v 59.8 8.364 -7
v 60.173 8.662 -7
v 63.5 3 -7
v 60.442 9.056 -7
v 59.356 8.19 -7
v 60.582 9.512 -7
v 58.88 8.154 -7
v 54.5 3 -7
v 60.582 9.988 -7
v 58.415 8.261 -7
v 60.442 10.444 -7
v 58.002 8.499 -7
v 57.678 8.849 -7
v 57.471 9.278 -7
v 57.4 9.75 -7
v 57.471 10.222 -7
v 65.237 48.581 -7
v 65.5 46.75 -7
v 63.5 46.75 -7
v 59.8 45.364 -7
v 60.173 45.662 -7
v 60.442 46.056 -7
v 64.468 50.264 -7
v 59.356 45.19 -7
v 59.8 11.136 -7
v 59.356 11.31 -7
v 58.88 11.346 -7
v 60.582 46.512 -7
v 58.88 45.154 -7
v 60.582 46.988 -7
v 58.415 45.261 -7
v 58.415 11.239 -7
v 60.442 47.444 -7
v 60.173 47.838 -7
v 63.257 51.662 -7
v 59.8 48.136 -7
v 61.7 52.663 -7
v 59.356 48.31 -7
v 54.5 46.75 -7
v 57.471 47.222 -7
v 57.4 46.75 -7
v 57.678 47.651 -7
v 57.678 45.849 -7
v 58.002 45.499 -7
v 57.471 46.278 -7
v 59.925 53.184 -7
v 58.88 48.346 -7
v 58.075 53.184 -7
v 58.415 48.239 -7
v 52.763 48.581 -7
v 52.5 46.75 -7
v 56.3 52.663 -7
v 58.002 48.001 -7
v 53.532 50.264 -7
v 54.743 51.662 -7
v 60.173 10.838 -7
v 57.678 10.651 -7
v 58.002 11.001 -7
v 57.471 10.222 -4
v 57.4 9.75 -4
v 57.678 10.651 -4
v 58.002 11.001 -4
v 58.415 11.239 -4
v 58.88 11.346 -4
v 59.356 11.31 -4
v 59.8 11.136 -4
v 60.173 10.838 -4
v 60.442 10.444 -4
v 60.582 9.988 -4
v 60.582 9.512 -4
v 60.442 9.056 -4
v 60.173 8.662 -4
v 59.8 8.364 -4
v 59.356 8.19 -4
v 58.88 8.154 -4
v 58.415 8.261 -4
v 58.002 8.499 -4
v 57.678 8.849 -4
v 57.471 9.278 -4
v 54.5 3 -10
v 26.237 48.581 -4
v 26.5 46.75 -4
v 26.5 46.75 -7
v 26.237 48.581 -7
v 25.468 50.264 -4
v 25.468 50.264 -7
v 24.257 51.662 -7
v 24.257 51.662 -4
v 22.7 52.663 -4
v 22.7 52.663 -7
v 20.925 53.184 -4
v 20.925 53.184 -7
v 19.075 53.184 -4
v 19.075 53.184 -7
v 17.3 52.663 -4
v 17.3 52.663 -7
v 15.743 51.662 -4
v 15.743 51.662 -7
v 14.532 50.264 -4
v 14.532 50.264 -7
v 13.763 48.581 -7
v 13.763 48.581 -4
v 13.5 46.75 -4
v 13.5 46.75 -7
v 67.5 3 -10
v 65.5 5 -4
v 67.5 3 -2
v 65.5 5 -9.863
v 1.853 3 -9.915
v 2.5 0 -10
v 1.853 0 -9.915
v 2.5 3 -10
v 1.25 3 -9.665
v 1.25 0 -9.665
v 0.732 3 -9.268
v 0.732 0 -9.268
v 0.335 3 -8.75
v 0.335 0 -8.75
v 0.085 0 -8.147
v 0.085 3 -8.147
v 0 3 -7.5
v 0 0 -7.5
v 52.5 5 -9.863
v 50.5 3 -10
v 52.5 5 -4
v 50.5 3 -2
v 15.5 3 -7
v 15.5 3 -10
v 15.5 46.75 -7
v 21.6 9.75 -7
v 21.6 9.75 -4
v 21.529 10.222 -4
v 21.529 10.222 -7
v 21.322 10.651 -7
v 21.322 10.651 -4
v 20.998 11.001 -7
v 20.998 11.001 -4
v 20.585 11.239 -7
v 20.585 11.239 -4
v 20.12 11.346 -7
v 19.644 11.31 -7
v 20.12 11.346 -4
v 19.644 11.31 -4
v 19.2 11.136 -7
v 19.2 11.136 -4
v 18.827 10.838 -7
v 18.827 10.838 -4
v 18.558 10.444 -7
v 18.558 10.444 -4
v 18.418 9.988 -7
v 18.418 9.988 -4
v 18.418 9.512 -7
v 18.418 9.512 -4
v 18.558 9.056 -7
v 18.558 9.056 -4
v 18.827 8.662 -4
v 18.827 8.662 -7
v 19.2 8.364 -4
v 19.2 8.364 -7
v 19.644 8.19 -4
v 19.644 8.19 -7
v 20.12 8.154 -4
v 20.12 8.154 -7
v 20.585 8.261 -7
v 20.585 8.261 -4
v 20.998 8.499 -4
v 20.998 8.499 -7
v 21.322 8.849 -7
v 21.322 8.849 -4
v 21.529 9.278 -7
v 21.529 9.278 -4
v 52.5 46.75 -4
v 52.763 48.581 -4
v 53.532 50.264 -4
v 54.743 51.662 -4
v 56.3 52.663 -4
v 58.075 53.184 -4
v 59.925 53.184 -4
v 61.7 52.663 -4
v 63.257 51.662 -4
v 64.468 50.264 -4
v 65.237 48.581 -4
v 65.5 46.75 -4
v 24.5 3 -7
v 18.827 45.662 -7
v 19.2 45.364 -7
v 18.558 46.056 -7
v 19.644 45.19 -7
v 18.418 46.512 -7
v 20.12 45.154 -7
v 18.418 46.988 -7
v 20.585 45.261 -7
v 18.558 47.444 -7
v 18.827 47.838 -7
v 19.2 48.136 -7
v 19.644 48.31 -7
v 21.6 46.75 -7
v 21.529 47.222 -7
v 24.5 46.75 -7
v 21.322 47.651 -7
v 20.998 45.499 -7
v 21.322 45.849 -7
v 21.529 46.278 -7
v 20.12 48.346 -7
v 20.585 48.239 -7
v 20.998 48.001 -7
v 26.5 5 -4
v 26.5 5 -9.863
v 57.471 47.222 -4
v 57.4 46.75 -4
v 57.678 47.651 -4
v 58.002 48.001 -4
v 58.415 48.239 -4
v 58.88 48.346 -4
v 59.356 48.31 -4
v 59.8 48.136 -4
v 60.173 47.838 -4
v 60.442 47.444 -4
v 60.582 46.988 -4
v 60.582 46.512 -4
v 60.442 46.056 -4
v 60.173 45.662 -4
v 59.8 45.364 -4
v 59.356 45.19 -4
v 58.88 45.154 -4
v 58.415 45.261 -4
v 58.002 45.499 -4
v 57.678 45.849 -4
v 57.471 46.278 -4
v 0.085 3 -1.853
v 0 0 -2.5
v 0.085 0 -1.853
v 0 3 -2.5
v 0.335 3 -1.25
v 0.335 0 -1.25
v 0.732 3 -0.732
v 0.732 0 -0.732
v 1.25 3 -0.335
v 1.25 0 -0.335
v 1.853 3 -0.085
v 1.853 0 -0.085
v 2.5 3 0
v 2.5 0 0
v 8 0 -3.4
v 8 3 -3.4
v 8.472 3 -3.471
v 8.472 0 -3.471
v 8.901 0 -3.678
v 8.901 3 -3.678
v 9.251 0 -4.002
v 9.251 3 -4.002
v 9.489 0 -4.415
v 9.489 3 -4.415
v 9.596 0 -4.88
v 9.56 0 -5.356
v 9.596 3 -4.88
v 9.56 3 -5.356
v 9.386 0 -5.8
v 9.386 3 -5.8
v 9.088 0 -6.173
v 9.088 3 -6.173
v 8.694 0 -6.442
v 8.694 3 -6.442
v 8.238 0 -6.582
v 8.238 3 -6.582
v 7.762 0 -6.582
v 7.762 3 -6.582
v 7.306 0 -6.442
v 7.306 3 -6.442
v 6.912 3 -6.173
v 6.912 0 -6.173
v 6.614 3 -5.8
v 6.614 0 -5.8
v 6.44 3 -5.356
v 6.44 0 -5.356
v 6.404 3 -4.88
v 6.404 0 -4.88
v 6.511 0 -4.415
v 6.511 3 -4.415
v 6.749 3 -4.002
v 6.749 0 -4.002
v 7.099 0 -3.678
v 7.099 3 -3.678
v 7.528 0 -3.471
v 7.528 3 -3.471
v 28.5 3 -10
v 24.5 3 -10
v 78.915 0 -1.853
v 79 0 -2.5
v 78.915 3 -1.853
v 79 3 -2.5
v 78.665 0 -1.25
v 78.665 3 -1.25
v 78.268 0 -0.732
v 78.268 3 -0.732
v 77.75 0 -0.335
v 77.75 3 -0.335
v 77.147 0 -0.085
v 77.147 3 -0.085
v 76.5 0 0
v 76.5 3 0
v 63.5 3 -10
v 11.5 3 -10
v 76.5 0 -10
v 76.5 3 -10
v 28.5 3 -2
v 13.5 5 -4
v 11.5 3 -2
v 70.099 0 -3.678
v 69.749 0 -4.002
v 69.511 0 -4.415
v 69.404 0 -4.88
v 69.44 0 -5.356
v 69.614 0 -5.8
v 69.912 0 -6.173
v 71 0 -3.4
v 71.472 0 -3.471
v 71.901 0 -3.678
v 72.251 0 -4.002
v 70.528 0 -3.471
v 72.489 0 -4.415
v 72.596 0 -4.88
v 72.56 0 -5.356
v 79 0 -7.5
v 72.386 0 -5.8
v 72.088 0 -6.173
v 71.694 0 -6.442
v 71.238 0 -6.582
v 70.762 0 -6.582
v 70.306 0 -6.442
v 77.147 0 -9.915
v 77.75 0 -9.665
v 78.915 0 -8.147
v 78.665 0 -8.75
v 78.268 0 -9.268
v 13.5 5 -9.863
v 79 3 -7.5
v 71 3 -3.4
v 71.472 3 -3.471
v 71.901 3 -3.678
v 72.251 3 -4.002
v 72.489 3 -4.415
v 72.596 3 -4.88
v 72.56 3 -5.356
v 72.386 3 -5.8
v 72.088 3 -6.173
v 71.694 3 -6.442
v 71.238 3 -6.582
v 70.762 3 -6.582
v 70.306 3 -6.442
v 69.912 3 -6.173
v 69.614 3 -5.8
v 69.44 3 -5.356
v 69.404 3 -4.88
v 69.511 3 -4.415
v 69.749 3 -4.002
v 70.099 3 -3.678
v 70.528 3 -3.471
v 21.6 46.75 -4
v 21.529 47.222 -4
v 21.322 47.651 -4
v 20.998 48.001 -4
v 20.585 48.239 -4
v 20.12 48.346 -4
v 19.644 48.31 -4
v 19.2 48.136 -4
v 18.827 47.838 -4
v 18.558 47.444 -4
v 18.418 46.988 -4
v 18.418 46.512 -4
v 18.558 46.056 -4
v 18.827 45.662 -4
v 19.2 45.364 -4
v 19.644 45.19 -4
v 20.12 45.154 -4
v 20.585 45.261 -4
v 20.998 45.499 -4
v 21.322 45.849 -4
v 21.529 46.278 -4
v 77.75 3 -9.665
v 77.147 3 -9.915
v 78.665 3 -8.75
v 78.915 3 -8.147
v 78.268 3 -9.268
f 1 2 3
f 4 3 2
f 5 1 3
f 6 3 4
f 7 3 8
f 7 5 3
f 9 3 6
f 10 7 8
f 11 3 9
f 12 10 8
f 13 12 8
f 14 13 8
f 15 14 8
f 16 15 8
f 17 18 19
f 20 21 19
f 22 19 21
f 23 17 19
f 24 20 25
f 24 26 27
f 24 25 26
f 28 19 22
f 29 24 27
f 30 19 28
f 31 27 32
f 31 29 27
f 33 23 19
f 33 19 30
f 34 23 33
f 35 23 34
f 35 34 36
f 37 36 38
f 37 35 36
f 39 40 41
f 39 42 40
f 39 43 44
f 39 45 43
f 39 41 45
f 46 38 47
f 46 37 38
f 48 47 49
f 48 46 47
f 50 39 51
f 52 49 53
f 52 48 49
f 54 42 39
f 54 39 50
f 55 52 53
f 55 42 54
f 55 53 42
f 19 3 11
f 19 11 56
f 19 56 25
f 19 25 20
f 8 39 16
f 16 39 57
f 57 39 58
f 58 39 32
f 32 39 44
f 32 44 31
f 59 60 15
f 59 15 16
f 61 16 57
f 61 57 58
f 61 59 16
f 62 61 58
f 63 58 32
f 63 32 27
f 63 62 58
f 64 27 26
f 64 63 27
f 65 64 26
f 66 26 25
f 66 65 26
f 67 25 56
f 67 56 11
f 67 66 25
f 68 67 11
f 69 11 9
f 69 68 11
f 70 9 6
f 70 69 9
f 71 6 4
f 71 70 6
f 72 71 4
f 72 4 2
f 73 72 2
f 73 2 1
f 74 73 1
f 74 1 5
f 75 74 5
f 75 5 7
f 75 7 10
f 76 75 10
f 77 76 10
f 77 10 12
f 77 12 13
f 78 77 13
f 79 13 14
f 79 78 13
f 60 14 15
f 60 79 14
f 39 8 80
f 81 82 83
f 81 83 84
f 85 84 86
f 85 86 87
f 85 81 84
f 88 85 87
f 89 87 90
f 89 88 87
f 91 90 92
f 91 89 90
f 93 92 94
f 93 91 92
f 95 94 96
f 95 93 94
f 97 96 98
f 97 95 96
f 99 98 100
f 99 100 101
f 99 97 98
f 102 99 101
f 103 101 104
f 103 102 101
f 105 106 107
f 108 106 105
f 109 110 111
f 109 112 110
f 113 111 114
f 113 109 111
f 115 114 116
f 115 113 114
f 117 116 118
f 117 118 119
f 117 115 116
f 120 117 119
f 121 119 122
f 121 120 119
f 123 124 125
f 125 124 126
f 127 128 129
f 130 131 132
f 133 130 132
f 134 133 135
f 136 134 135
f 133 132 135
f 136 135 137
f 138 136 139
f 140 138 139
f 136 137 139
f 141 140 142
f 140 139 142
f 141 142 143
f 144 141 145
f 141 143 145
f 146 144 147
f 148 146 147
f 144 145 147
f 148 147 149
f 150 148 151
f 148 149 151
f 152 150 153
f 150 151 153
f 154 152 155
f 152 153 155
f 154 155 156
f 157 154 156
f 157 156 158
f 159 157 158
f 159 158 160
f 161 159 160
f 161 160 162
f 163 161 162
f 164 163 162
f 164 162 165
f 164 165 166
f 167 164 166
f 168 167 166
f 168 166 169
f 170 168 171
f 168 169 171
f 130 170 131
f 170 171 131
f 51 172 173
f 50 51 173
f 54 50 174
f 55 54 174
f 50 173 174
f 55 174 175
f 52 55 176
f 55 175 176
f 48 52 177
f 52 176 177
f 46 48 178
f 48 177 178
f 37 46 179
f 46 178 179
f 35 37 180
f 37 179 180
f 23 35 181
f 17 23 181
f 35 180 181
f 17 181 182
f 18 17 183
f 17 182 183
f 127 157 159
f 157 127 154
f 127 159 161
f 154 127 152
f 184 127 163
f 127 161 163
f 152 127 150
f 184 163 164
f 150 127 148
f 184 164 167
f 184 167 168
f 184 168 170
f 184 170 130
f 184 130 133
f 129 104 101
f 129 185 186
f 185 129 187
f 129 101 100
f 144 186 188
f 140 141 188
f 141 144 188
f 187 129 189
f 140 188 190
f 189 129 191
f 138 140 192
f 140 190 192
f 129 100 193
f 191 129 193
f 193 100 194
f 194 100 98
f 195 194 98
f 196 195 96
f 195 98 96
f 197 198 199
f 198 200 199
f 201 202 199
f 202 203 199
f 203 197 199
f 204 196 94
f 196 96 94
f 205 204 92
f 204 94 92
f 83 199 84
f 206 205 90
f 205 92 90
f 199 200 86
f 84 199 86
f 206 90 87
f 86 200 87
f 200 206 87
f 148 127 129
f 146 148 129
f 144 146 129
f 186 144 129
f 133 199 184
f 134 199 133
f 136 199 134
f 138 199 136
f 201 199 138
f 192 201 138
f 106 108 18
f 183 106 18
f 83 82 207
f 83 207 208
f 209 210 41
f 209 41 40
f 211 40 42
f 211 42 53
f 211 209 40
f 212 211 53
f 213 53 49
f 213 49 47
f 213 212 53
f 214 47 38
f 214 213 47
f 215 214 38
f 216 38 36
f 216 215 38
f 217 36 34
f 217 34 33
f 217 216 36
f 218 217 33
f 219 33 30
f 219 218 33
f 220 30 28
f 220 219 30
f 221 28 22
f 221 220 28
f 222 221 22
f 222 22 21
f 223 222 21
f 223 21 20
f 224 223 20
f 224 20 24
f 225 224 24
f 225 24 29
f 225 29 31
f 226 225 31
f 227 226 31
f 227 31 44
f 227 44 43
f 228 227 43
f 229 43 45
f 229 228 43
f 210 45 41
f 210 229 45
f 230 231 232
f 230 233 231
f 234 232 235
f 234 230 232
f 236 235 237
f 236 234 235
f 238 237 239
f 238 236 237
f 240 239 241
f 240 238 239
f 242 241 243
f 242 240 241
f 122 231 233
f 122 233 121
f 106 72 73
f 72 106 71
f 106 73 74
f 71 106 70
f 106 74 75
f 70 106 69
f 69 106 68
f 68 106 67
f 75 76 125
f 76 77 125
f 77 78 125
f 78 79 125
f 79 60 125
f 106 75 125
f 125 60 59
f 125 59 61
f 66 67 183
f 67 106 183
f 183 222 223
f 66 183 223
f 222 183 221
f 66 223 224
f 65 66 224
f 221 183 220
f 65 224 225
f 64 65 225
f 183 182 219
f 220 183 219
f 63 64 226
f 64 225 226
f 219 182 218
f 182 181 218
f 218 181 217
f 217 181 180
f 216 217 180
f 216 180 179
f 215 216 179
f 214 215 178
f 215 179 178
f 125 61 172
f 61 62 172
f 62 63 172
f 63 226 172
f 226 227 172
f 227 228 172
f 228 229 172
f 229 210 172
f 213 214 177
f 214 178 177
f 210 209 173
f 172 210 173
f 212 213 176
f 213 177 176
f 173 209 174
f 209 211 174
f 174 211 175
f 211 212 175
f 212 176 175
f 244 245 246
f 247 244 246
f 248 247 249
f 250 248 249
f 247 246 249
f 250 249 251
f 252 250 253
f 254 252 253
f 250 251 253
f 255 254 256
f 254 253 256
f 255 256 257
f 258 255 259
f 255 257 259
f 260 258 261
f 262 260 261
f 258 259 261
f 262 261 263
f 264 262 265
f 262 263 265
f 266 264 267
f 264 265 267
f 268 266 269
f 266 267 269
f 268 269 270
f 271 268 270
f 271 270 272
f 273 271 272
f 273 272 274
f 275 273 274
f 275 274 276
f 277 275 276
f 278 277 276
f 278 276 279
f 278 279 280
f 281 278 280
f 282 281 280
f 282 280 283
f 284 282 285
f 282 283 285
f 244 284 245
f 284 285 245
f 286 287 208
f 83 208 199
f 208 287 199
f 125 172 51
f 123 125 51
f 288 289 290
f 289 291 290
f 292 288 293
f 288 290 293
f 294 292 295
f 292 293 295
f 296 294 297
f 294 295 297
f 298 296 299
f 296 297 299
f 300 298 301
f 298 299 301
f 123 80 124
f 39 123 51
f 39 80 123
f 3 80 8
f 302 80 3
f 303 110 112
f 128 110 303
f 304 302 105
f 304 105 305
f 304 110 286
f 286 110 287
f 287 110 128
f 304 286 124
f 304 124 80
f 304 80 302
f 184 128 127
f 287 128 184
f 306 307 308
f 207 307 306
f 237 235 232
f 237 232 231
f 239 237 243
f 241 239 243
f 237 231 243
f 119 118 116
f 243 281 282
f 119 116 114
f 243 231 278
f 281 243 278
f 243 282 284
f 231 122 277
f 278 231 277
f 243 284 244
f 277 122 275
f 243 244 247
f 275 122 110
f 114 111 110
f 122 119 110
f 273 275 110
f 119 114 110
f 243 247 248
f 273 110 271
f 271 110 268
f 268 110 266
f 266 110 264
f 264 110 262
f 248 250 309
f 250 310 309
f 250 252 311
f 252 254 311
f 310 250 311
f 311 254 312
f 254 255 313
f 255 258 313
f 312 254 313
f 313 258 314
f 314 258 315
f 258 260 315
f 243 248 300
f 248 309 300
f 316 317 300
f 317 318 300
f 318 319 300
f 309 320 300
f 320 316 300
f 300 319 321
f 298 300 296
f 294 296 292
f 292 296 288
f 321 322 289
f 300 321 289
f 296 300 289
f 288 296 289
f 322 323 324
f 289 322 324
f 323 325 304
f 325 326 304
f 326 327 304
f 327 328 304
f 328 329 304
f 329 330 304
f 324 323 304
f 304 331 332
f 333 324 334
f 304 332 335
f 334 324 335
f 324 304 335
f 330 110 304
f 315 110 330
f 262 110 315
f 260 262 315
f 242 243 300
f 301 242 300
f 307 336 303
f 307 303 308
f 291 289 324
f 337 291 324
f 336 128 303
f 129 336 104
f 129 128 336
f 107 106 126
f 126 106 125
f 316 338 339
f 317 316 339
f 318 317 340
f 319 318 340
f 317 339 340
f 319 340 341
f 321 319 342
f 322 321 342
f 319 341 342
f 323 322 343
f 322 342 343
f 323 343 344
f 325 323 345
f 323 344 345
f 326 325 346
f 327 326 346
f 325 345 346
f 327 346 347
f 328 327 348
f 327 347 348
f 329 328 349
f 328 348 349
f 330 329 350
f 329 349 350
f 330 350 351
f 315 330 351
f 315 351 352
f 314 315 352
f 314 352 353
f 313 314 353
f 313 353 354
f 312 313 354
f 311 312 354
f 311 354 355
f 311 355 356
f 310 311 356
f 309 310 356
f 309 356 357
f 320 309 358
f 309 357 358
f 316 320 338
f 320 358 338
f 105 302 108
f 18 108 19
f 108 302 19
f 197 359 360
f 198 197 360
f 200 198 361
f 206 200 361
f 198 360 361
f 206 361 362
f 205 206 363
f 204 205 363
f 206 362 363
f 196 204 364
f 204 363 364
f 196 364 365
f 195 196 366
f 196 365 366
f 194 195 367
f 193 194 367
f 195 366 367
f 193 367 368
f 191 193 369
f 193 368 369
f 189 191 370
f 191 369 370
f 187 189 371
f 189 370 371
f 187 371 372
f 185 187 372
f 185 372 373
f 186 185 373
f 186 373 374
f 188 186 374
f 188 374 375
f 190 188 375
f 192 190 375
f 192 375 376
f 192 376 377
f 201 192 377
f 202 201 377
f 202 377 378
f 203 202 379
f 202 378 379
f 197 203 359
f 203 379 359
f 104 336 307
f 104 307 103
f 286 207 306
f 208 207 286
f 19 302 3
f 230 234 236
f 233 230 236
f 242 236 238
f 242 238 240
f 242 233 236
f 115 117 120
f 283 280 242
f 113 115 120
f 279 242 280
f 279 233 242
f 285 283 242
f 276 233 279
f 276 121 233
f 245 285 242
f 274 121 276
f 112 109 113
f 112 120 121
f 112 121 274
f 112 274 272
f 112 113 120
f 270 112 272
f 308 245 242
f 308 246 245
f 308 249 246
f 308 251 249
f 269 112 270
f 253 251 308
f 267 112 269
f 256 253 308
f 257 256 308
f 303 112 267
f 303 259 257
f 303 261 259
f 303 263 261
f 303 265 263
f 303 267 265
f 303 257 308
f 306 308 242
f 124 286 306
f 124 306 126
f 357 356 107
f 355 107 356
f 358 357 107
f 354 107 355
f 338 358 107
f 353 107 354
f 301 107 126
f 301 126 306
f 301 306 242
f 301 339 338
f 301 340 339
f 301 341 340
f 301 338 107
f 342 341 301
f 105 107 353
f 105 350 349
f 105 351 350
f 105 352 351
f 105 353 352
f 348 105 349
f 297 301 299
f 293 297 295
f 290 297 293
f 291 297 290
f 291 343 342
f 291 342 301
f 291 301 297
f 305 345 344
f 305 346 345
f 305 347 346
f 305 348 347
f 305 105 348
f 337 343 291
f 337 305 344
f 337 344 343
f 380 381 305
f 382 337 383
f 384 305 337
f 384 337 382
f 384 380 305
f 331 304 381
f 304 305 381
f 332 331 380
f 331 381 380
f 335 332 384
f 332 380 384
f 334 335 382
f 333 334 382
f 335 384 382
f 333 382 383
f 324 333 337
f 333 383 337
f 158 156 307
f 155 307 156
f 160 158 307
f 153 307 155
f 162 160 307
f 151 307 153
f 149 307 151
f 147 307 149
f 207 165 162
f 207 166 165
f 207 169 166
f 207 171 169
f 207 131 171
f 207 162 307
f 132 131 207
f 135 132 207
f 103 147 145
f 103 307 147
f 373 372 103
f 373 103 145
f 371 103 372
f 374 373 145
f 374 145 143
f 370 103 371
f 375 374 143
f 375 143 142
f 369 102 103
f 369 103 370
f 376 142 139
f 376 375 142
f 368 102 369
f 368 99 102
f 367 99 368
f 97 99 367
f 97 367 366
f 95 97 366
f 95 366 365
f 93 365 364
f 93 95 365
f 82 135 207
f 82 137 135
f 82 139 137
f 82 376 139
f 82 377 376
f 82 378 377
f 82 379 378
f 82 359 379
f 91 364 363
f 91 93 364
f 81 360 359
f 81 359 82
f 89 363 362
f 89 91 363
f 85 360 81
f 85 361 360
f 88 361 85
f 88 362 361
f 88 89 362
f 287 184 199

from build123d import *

# Parameters (mm, degrees)
SKETCH_1_W                 = 79
SKETCH_1_H                 = 10
EXTRUDE_1_DEPTH            = 3
SKETCH_2_W                 = 13
SKETCH_2_H                 = 3
EXTRUDE_2_DEPTH            = 43.75
EXTRUDE_3_DEPTH            = 3
RIB_1_REACH                = 87.005
SKETCH_5_WALL_W            = 215.862295072
SKETCH_5_WALL_H            = 2
RIB_2_REACH                = 77.444
SKETCH_7_WALL_W            = 196.740940164
SKETCH_7_WALL_H            = 2
SKETCH_8_R                 = 1.6
CUT_EXTRUDE_1_DEPTH        = 3
FILLET_1_R                 = 2.5
SKETCH_9_R                 = 1.6
CUT_EXTRUDE_5_DEPTH        = 3
CHAMFER_2_SIZE             = 2
CHAMFER_2_OF_MIRROR_1_SIZE = 2


with BuildPart() as part:
    # 草图1 → 凸台-拉伸1 (new body)
    with BuildSketch(Plane(origin=(0, 0, 0), x_dir=(1, 0, 0), z_dir=(0, 1, 0))):
        with Locations((39.5, 5)):
            Rectangle(SKETCH_1_W, SKETCH_1_H)
    extrude(amount=EXTRUDE_1_DEPTH)

    # 草图2 → 凸台-拉伸2 (add)
    with BuildSketch(Plane(origin=(0, 3, 0), x_dir=(1, 0, 0), z_dir=(0, 1, 0))):
        with Locations((20, 5.5)):
            Rectangle(SKETCH_2_W, SKETCH_2_H)
    extrude_2 = extrude(amount=EXTRUDE_2_DEPTH)

    # 草图4 → 凸台-拉伸3 (add)
    with BuildSketch(Plane.XY.offset(-4)):
        with BuildLine():
            Line((13.5, 46.75), (26.5, 46.75))
            ThreePointArc((26.5, 46.75), (20, 53.25), (13.5, 46.75))
        make_face()
    extrude_3 = extrude(amount=-EXTRUDE_3_DEPTH)

    # 草图5 wall → 筋1 (add, up to next)
    with BuildSketch(Plane(origin=(13.5, 24.875, -8.5), x_dir=(0, 0.997657238183, 0.068410782047), z_dir=(0, 0.068410782047, -0.997657238183)), mode=Mode.PRIVATE) as rib_1_sk1:
        with Locations((0, 1)):
            Rectangle(SKETCH_5_WALL_W, SKETCH_5_WALL_H)
    rib_1_tool1 = extrude(rib_1_sk1.sketch, amount=-RIB_1_REACH, mode=Mode.PRIVATE) - part.part
    rib_1 = rib_1_tool1.solids().sort_by_distance((13.5, 24.875, -8.5))[0]
    add(rib_1)

    # 草图7 wall → 筋2 (add, up to next)
    with BuildSketch(Plane(origin=(26.5, 24.875, -8.5), x_dir=(0, -0.997657238183, -0.068410782047), z_dir=(0, 0.068410782047, -0.997657238183)), mode=Mode.PRIVATE) as rib_2_sk1:
        with Locations((0, 1)):
            Rectangle(SKETCH_7_WALL_W, SKETCH_7_WALL_H)
    rib_2_tool1 = extrude(rib_2_sk1.sketch, amount=-RIB_2_REACH, mode=Mode.PRIVATE) - part.part
    rib_2 = rib_2_tool1.solids().sort_by_distance((26.5, 24.875, -8.5))[0]
    add(rib_2)

    # 草图8 → 切除-拉伸1 (cut)
    with BuildSketch(Plane.XY.offset(-4)):
        with Locations((20, 9.75)):
            Circle(SKETCH_8_R)
        with Locations((20, 46.75)):
            Circle(SKETCH_8_R)
    cut_extrude_1 = extrude(amount=-CUT_EXTRUDE_1_DEPTH, mode=Mode.SUBTRACT)

    # 圆角1
    fillet_1_edges = [part.edges().sort_by_distance(p)[0] for p in [
        (0, 1.5, -10),
        (79, 1.5, -10),
        (79, 1.5, 0),
        (0, 1.5, 0),
    ]]
    fillet(fillet_1_edges, radius=FILLET_1_R)

    # 草图9 → 切除-拉伸5 (cut)
    with BuildSketch(Plane(origin=(0, 3, 0), x_dir=(1, 0, 0), z_dir=(0, 1, 0))):
        with Locations((8, 5)):
            Circle(SKETCH_9_R)
        with Locations((71, 5)):
            Circle(SKETCH_9_R)
    extrude(amount=-CUT_EXTRUDE_5_DEPTH, mode=Mode.SUBTRACT)

    # 倒角2
    chamfer_2_edges = [part.edges().sort_by_distance(p)[0] for p in [
        (20, 3, -4),
        (26.5, 3, -7),
        (13.5, 3, -7),
    ]]
    chamfer(chamfer_2_edges, length=CHAMFER_2_SIZE)

    # 镜向1: 凸台-拉伸2, 凸台-拉伸3, 筋1, 筋2, 切除-拉伸1 across plane
    add(extrude_2.mirror(Plane.ZY.offset(-39.5)))
    add(extrude_3.mirror(Plane.ZY.offset(-39.5)))
    add(rib_1.mirror(Plane.ZY.offset(-39.5)))
    add(rib_2.mirror(Plane.ZY.offset(-39.5)))
    add(cut_extrude_1.mirror(Plane.ZY.offset(-39.5)), mode=Mode.SUBTRACT)

    # 倒角2 of 镜向1
    chamfer_2_of_mirror_1_edges = [part.edges().sort_by_distance(p)[0] for p in [
        (59, 3, -4),
        (52.5, 3, -7),
        (65.5, 3, -7),
    ]]
    chamfer(chamfer_2_of_mirror_1_edges, length=CHAMFER_2_OF_MIRROR_1_SIZE)


solid = part.part
